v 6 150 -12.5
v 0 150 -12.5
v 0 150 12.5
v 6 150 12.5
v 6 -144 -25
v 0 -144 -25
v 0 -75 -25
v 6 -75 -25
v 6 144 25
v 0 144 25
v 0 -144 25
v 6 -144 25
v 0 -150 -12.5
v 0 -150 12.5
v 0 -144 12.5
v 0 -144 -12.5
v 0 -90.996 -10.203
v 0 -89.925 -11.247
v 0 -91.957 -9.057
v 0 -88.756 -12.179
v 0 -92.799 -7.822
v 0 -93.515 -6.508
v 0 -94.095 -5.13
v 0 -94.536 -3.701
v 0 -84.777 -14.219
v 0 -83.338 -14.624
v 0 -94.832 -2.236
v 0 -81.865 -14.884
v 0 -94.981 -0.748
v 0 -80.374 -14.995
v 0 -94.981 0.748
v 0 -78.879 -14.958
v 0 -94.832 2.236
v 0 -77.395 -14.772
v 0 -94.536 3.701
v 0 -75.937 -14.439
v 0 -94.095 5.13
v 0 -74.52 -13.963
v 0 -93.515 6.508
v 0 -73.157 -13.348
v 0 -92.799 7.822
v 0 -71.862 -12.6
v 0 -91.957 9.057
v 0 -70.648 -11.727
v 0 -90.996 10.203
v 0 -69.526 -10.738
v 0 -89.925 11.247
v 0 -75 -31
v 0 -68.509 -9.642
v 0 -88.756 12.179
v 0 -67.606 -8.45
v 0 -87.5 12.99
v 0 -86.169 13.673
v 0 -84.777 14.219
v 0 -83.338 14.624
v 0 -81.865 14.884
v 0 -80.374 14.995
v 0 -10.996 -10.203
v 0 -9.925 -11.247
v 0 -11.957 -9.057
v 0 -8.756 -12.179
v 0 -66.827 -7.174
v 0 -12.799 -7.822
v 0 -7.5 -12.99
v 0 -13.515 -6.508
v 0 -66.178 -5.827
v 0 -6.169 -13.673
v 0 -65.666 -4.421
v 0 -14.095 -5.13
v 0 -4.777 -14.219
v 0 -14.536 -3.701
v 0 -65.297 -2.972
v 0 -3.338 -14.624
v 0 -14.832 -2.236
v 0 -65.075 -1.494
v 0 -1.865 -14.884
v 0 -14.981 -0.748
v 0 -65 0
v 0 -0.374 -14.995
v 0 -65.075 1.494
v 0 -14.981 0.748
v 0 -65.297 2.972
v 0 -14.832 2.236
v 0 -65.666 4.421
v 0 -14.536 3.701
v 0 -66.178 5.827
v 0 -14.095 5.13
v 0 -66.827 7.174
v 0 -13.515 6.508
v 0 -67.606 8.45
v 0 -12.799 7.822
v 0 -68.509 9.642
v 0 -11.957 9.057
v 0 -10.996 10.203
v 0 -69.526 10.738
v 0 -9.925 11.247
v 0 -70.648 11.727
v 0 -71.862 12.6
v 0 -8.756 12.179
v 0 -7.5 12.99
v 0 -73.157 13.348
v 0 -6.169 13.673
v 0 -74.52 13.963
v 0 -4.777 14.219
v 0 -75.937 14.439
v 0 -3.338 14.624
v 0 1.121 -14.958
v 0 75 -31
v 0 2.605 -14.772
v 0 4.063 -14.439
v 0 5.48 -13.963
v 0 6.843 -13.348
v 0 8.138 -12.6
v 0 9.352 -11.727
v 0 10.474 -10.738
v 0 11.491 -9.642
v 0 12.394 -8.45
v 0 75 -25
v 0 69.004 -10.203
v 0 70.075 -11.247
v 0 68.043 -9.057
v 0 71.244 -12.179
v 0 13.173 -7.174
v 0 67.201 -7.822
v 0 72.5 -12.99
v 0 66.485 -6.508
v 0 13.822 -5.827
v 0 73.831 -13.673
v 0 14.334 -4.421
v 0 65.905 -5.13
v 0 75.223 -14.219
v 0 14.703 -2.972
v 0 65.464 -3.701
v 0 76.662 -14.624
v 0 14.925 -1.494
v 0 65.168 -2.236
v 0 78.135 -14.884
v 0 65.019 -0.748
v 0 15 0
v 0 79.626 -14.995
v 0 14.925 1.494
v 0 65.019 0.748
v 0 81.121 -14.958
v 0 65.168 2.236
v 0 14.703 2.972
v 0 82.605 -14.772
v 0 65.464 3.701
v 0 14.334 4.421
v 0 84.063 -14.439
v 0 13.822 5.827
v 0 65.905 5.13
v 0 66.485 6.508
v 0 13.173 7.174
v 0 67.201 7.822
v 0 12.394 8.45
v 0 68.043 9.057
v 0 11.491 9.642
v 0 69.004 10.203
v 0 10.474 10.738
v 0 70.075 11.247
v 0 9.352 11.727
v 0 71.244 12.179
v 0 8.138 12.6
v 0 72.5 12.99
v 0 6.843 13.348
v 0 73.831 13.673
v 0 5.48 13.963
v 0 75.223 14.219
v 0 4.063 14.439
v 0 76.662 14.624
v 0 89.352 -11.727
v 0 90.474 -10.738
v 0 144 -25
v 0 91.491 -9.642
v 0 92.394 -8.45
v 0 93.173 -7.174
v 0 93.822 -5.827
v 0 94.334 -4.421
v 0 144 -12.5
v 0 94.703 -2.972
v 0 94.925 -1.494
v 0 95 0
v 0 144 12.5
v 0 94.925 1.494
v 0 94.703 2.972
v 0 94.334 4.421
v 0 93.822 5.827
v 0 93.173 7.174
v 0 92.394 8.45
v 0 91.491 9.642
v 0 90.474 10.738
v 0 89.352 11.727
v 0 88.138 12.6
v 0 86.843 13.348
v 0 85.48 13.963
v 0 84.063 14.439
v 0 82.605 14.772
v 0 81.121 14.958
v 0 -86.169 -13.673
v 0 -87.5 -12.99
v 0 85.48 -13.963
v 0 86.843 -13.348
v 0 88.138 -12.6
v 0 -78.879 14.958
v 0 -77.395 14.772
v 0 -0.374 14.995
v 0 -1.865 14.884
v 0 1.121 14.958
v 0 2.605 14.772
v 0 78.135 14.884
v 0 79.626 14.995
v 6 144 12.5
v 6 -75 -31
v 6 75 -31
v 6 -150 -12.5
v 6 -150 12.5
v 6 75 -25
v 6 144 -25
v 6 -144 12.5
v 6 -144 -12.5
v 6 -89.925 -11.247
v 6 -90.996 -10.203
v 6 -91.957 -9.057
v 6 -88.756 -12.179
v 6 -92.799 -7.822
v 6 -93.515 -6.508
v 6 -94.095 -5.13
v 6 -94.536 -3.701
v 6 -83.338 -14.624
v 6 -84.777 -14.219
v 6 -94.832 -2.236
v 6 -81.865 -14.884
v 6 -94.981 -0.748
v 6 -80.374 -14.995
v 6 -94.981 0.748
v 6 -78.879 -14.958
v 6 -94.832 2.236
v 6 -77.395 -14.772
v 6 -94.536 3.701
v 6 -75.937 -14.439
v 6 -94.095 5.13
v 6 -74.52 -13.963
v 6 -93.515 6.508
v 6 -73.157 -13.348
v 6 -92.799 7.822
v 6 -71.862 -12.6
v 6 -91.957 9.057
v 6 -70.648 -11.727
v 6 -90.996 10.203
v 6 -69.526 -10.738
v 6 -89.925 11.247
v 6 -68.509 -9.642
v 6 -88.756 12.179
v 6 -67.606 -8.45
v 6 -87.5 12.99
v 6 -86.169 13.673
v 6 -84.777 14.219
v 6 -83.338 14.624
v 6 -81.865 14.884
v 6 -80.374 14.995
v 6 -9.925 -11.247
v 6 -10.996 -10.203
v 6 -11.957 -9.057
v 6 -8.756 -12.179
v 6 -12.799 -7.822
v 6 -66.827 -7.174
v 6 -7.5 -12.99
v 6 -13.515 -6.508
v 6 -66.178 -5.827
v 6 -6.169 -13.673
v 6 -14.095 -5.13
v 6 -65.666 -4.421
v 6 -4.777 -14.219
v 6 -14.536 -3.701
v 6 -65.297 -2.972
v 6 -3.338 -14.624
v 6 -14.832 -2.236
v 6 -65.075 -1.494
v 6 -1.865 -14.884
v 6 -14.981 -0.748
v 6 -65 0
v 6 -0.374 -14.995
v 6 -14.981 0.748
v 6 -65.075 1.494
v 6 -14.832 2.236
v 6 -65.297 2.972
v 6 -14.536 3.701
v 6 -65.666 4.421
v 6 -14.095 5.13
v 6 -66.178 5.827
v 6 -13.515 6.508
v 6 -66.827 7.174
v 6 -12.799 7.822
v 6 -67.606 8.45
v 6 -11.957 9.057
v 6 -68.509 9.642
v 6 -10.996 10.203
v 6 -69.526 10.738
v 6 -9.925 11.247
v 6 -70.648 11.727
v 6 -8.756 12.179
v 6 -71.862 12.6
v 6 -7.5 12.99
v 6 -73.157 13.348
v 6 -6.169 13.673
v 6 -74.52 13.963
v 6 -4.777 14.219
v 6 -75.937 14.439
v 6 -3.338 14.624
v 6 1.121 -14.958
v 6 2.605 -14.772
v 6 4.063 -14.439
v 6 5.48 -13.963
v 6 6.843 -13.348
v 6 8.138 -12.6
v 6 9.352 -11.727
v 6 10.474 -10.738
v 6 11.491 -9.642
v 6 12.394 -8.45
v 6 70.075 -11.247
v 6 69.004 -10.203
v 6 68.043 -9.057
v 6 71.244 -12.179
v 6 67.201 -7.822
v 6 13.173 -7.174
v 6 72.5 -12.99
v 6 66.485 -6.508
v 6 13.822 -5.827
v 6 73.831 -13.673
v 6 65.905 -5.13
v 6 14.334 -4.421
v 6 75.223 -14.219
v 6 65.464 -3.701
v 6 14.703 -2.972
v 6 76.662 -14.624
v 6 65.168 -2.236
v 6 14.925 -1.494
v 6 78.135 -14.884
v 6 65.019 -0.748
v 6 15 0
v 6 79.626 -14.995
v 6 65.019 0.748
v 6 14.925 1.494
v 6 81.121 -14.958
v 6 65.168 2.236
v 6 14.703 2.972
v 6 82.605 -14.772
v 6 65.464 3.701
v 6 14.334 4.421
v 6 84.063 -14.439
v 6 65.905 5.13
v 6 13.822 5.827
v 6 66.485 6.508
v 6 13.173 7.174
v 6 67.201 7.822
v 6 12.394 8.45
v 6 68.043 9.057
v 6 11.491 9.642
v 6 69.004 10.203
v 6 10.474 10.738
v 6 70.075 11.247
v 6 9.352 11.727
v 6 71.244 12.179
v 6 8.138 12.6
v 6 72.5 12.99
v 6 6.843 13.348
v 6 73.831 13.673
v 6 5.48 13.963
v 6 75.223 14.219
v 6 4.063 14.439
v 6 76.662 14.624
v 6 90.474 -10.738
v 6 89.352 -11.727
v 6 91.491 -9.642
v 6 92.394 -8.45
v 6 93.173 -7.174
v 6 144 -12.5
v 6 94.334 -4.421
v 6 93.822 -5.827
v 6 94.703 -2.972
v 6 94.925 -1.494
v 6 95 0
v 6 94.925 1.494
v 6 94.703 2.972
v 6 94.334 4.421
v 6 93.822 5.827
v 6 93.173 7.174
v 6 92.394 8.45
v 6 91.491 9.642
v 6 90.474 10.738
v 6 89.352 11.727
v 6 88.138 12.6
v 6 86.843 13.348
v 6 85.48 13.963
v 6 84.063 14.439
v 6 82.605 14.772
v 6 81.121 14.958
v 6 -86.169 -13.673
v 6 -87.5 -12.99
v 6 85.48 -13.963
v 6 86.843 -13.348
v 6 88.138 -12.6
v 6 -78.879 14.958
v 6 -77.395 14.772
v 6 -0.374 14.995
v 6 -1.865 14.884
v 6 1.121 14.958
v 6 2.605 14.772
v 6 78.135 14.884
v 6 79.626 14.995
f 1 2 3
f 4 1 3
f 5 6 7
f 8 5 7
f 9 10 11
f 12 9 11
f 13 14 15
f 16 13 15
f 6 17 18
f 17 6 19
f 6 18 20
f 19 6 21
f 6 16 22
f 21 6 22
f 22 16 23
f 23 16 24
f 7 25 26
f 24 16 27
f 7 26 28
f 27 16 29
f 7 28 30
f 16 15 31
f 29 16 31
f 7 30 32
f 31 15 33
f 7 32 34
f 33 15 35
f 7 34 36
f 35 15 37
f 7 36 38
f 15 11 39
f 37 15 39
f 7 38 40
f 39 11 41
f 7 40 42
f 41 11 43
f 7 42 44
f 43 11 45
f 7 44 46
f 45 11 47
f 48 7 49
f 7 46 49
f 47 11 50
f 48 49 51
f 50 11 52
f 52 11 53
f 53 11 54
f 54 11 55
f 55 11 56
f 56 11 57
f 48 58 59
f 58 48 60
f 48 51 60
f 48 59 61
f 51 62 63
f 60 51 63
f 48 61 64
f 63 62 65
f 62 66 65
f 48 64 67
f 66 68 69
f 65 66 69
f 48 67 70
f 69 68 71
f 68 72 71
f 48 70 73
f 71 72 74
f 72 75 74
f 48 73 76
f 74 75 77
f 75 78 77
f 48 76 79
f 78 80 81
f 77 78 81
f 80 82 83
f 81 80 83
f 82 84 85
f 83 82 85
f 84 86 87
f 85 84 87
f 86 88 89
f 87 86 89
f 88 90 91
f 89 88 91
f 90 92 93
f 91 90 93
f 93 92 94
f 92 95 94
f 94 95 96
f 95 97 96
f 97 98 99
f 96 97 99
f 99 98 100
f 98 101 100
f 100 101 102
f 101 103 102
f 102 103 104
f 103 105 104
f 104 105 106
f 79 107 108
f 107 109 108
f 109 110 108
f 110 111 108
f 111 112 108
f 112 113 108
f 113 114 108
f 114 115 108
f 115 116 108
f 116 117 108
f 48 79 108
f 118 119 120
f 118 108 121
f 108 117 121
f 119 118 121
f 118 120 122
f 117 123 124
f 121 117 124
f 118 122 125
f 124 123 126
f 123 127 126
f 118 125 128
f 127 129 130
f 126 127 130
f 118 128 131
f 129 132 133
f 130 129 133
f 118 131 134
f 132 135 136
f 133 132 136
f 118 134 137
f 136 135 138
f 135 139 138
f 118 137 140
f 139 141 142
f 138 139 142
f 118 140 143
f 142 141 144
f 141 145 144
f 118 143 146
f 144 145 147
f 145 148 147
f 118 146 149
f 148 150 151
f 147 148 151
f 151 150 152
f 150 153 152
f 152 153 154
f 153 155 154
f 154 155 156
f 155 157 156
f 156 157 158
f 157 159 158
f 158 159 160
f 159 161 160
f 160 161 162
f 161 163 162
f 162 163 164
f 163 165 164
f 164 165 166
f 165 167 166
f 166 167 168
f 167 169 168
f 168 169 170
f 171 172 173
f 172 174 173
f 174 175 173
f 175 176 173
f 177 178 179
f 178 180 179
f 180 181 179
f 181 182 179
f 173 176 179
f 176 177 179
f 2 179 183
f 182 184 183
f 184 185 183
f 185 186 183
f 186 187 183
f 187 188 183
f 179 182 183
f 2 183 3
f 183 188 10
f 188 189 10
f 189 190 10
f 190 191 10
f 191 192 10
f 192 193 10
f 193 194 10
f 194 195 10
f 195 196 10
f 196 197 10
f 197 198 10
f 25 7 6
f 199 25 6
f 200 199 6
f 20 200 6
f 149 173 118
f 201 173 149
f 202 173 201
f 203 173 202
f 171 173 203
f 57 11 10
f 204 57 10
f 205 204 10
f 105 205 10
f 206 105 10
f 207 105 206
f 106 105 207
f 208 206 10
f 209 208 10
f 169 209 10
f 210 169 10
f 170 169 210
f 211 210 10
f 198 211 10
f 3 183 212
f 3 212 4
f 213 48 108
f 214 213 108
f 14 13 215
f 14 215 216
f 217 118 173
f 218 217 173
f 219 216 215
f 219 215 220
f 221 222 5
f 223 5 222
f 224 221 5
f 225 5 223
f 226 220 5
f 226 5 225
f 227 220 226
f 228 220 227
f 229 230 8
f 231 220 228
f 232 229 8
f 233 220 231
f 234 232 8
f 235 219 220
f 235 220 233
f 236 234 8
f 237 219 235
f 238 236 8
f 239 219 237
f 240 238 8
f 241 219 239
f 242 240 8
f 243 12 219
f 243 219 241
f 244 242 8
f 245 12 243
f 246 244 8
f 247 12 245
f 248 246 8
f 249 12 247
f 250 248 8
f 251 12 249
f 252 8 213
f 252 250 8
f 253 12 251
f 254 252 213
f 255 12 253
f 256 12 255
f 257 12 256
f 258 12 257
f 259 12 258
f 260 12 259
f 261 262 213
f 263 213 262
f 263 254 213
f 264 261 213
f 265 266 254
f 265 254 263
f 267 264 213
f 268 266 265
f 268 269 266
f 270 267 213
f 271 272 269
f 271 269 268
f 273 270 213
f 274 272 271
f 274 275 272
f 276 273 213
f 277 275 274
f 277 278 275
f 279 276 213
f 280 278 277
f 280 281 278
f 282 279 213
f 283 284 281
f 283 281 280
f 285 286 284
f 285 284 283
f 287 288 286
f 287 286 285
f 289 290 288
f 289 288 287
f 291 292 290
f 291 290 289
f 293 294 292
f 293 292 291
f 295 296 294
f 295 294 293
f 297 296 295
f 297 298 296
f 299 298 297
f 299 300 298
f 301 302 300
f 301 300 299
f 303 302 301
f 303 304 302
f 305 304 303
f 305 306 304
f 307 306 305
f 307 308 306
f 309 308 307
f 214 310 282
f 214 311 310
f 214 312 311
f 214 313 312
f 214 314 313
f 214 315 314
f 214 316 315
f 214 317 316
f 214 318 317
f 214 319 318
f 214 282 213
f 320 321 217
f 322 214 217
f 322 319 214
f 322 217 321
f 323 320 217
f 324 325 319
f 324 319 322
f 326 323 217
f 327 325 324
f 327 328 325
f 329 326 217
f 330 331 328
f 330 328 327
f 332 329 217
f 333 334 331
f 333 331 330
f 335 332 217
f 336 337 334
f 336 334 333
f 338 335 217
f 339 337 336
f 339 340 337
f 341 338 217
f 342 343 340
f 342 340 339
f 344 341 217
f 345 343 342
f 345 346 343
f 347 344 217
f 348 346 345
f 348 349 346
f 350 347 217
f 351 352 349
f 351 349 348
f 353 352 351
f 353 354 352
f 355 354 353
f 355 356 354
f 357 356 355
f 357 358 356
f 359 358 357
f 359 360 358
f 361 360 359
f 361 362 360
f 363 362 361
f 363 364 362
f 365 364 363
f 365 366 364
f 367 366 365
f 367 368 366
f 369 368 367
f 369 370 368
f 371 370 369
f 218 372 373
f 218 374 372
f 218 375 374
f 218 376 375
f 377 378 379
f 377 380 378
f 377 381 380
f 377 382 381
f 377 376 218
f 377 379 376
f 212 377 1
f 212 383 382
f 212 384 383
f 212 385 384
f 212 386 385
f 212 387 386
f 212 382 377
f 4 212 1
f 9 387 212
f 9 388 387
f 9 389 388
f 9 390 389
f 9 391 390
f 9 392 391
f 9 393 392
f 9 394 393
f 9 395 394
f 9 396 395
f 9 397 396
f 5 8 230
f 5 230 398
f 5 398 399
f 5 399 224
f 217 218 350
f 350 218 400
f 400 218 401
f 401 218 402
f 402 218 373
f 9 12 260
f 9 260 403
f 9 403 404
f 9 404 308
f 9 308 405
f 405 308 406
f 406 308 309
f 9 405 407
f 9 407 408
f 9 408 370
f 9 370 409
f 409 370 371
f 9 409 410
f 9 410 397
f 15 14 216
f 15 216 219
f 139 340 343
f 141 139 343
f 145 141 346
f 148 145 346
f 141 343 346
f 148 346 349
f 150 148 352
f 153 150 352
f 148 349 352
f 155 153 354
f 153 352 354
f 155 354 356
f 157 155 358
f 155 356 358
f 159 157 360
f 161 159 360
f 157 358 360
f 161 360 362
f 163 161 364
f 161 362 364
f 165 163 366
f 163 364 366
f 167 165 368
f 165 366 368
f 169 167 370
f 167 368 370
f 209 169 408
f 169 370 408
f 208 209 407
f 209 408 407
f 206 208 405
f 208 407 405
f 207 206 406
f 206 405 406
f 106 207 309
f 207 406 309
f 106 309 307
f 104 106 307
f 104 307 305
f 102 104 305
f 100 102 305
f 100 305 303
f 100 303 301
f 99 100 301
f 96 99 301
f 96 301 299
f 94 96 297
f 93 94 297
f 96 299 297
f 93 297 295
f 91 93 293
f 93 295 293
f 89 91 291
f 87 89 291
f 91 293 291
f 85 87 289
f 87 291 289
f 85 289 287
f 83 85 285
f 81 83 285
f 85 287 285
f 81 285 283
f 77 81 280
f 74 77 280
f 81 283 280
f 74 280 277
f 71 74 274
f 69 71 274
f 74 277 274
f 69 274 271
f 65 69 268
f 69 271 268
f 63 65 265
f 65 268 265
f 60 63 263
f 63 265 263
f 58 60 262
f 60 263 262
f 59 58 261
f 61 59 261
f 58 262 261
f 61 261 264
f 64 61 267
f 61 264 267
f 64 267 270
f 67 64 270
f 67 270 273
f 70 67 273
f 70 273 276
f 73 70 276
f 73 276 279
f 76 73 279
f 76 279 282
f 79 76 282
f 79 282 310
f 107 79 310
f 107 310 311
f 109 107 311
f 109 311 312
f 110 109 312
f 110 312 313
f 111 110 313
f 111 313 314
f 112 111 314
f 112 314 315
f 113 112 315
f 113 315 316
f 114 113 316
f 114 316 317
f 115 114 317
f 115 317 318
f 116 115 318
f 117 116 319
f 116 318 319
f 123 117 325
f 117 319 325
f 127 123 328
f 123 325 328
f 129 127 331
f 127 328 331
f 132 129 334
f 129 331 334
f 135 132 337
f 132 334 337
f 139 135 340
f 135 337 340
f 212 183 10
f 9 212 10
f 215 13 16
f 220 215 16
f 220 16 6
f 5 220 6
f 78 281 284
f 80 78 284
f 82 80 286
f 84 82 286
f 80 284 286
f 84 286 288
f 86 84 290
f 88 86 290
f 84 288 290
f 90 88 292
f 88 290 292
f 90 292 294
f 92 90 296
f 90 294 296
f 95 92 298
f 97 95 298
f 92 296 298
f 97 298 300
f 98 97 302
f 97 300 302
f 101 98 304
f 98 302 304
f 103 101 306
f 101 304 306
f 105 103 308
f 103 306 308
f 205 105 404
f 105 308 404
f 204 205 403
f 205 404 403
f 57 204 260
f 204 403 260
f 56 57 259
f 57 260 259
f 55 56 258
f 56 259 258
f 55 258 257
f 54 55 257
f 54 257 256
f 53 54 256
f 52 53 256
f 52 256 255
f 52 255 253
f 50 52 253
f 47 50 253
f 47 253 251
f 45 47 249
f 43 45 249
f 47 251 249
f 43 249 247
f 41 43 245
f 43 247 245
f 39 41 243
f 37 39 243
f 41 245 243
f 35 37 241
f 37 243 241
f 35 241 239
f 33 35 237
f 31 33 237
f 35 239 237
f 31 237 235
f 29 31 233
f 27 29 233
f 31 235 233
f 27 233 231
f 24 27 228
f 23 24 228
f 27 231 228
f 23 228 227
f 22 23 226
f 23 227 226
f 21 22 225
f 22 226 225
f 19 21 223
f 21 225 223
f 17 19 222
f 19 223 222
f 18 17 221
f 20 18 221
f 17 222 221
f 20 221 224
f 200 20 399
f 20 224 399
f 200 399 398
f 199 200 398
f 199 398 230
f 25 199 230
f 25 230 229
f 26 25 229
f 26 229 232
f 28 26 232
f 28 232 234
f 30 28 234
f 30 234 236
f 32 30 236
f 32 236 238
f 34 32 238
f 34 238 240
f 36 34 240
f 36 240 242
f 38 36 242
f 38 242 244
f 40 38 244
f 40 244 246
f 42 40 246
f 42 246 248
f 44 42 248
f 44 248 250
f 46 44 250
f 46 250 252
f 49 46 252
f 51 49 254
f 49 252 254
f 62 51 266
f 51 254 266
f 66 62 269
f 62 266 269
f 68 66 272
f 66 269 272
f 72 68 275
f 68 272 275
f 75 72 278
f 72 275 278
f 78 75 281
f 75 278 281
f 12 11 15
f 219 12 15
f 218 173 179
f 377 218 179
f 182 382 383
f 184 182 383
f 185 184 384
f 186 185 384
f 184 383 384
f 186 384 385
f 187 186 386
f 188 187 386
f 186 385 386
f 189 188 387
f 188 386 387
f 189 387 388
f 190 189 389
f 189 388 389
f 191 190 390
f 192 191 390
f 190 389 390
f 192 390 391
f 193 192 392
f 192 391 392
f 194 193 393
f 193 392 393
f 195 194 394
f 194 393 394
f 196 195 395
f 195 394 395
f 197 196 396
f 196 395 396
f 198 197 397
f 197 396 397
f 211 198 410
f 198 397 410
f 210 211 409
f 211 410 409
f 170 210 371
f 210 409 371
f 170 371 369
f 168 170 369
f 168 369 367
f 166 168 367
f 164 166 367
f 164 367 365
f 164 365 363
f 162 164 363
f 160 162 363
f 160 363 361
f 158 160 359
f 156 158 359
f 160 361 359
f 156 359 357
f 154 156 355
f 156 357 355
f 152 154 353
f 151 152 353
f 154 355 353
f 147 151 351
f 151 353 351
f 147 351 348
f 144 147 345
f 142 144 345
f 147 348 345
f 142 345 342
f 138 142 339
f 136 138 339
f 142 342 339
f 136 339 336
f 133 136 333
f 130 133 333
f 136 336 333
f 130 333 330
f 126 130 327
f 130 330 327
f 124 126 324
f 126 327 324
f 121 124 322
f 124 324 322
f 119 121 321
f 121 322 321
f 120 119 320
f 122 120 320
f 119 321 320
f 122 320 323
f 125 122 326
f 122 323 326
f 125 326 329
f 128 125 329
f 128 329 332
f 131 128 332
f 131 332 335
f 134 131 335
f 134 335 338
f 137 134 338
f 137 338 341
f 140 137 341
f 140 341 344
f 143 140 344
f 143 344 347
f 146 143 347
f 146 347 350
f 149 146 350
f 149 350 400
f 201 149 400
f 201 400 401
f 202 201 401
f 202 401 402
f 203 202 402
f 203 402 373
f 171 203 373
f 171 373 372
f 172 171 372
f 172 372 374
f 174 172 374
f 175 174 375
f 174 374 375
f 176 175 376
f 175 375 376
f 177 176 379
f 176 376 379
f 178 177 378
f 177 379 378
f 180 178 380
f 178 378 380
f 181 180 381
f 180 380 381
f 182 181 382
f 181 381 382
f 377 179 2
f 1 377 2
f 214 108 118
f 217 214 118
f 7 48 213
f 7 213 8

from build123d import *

# Parameters (mm, degrees)
F0_W     = 150
F0_H     = 6
F0_W_2   = 6
F0_H_2   = 25
F1_DEPTH = 6
F2_R     = 15
F3_DEPTH = 6


with BuildPart() as f1:
    # F0 (on Right) → F1 (new body)
    with BuildSketch(Plane.YZ):
        Polygon((-75, 25), (-144, 25), (-144, 12.5), (-138, 12.5), (-138, -12.5), (-144, -12.5), (-144, -25), (-75, -25), (-75, -19), (75, -19), (75, -25), (144, -25), (144, -12.5), (138, -12.5), (138, 12.5), (144, 12.5), (144, 25), (75, 25), (75, 19), (-75, 19), align=None)
        with Locations((0, 22)):
            Rectangle(F0_W, F0_H)
        with Locations((0, -28)):
            Rectangle(F0_W, F0_H)
        with Locations((0, -22)):
            Rectangle(F0_W, F0_H)
        with Locations((-141, 0)):
            Rectangle(F0_W_2, F0_H_2)
        with Locations((-147, 0)):
            Rectangle(F0_W_2, F0_H_2)
        with Locations((147, 0)):
            Rectangle(F0_W_2, F0_H_2)
        with Locations((141, 0)):
            Rectangle(F0_W_2, F0_H_2)
    extrude(amount=F1_DEPTH)

    # F2 (on face) → F3 (cut, through all)
    with BuildSketch(Plane.YZ.offset(6)):
        Circle(F2_R)
        with Locations((-80, 0)):
            Circle(F2_R)
        with Locations((80, 0)):
            Circle(F2_R)
    extrude(amount=-F3_DEPTH, mode=Mode.SUBTRACT)


solid = f1.part
